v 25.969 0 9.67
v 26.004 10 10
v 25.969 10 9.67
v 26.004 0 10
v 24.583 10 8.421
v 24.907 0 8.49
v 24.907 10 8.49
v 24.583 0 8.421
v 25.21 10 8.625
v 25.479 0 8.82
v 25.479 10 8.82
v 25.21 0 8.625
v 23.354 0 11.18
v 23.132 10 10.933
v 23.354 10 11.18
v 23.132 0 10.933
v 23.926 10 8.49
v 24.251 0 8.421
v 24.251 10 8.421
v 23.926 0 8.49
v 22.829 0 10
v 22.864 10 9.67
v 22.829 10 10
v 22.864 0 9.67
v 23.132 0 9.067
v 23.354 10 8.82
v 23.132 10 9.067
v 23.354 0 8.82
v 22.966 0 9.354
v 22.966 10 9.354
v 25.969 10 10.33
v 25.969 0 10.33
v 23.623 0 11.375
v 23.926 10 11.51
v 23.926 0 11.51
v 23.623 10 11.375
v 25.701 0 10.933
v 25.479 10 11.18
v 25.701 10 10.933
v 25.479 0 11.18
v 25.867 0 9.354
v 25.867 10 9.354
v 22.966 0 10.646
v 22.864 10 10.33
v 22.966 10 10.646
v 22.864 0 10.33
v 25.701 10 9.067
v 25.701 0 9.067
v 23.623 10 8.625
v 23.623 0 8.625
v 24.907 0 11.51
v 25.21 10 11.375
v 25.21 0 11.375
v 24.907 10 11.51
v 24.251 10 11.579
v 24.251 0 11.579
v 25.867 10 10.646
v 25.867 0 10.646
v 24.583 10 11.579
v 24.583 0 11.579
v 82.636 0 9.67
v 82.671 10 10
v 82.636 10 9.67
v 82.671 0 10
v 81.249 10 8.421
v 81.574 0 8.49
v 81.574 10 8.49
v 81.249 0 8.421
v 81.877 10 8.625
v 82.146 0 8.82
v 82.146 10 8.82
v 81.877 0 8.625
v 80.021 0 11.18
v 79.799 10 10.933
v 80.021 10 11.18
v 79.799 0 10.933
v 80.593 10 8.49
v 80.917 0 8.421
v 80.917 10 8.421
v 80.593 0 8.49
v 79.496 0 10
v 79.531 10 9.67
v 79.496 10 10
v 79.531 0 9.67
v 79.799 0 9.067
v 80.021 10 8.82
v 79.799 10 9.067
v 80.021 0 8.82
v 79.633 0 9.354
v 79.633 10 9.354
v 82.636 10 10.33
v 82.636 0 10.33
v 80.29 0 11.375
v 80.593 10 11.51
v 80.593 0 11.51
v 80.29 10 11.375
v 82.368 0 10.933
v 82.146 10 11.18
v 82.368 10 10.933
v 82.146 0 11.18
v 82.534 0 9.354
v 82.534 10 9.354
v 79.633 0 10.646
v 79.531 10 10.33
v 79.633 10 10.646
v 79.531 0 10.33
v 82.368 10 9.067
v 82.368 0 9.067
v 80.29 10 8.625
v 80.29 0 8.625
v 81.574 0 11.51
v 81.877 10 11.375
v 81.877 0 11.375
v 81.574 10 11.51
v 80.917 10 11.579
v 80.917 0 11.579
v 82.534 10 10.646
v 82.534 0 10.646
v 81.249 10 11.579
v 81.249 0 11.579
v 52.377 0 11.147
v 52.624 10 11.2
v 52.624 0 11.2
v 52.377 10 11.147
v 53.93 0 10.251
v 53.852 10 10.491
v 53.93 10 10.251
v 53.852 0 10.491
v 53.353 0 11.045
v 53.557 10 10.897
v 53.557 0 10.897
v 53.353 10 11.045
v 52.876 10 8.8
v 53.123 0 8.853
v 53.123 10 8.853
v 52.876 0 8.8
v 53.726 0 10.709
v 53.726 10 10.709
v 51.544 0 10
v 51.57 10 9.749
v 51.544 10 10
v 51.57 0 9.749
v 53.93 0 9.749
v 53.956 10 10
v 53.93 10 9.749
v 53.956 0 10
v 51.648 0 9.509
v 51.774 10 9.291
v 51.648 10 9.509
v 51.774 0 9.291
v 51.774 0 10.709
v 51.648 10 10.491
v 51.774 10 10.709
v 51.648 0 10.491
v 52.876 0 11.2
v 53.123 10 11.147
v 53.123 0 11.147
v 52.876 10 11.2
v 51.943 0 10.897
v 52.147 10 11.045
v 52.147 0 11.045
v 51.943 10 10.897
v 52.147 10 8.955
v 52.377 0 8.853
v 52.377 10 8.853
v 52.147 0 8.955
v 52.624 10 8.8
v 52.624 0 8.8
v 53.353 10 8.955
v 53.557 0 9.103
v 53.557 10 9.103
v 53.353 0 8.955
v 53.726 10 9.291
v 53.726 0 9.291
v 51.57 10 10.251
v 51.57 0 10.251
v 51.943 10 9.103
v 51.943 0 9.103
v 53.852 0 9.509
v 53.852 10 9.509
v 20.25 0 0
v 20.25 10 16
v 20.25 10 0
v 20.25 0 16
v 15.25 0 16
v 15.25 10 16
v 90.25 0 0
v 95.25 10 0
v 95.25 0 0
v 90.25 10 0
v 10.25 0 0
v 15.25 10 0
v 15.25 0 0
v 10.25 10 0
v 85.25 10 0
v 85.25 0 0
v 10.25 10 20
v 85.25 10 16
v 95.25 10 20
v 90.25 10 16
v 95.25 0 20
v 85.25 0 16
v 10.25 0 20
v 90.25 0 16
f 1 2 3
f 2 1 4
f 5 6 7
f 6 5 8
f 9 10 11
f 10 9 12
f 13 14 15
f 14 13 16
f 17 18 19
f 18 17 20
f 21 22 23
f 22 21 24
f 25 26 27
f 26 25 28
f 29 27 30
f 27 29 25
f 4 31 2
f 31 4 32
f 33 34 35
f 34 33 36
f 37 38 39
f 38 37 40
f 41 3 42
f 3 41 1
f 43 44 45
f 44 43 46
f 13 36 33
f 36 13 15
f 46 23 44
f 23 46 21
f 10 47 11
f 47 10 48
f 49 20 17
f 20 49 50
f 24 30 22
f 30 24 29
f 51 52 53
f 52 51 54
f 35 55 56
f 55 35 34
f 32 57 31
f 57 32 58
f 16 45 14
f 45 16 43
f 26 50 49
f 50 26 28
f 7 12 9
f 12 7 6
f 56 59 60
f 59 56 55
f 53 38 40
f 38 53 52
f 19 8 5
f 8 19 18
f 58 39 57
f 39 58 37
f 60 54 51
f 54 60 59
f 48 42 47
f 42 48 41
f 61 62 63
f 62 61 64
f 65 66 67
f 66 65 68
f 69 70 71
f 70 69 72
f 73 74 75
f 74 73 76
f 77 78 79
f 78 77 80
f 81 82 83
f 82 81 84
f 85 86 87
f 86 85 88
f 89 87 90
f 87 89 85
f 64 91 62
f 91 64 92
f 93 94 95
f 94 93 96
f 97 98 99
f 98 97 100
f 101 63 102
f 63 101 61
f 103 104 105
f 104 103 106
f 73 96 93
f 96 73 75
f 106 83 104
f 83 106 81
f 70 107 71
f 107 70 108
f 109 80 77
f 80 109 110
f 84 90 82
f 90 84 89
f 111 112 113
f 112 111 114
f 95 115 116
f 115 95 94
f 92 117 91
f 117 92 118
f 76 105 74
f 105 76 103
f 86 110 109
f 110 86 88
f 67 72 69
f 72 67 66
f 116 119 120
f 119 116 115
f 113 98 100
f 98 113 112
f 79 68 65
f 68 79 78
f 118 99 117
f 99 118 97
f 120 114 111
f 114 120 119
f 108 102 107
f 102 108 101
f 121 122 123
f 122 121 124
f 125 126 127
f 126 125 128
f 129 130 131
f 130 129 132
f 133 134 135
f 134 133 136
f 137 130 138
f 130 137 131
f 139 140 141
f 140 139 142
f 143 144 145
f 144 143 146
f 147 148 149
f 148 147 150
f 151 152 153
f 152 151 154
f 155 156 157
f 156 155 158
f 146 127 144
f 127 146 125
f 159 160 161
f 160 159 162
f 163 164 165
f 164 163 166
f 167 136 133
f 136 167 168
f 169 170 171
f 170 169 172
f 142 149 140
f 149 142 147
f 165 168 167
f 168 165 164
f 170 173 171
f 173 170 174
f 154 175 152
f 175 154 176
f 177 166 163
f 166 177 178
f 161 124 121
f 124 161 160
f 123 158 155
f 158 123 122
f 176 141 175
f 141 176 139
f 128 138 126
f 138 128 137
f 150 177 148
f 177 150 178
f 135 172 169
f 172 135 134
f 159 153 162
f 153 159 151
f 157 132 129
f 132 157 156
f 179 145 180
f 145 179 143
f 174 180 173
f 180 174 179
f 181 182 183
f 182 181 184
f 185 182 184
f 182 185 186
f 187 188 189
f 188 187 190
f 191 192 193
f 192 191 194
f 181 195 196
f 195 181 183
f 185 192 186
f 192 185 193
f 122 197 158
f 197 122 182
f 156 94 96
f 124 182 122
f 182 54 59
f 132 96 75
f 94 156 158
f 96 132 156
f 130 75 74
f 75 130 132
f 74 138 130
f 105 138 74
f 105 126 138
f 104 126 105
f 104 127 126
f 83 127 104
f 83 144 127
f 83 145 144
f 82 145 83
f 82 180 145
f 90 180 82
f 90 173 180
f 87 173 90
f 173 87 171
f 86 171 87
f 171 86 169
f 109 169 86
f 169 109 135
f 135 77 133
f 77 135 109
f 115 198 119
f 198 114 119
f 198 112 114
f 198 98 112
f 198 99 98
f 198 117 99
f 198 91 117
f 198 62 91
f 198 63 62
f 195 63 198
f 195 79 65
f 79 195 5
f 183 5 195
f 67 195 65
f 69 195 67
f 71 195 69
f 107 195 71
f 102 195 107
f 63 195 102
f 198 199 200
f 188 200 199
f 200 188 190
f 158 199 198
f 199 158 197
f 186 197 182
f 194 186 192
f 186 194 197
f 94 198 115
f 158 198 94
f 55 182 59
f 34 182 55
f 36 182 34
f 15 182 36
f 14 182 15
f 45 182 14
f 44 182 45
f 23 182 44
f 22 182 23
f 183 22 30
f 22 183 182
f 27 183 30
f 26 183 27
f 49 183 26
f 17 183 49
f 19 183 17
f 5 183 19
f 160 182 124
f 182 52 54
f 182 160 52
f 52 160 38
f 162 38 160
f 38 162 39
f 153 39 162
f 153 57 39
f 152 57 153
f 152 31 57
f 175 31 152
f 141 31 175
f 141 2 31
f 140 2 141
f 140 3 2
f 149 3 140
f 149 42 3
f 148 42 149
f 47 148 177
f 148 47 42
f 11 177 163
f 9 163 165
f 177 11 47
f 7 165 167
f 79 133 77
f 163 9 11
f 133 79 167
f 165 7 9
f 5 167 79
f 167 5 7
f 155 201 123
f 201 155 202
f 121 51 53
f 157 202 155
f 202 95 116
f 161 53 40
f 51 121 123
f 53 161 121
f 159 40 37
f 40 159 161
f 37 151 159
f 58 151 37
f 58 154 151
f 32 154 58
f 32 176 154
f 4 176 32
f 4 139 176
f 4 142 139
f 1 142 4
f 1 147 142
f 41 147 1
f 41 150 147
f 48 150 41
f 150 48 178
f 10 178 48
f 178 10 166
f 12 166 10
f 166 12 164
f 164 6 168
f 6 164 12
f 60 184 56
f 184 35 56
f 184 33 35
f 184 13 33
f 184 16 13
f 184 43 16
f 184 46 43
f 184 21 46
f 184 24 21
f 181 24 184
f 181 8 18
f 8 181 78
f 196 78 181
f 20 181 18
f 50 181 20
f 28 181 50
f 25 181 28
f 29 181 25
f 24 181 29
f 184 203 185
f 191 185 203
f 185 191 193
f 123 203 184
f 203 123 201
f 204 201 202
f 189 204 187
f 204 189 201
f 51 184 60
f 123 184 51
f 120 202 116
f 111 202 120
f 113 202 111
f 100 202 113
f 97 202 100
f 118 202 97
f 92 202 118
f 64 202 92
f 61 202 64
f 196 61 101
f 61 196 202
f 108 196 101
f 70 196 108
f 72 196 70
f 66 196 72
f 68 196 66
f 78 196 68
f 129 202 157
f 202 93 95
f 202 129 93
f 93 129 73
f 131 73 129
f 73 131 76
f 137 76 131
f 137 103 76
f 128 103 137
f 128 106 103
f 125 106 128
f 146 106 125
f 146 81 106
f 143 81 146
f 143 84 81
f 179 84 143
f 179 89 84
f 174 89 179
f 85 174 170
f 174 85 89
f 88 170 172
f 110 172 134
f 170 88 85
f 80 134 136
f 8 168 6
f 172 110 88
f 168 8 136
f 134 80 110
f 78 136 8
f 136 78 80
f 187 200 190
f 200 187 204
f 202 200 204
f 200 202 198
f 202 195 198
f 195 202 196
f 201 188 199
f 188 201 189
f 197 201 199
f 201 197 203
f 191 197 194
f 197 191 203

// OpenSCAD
// file: tall_wall.scad
include <defs.scad>
use <assembly.scad>
use <slab.scad>

module TallWall()
{
    cube([tall_wall_x, tall_wall_y, tall_wall_z ]);
}


difference()
{
    tall_wall_origin()
    {
        TallWall();
    }
    Holes();
}
// file: slab.scad
include <defs.scad>


module make_slab()
{
    cube([slab_x, slab_y, slab_z]);
}

module make_linear_hole()
{
    rotate([-90,0,0]) cylinder(slab_y,linear_bearing_or,linear_bearing_or);
    // infinite hole
    rotate([-90,0,180]) cylinder(forever,linear_bearing_ir,linear_bearing_ir);
}
module make_bearing_insert()
{
    rotate([-90,0,0]) cylinder(bearing_y,bearing_or,bearing_or);
    // infinite hole
    r = bearing_ir - threaded_rod_r_grip;
    rotate([-90,0,180]) cylinder(forever,r,r);
}


module make_slab_holes()
{
    translate([linear_bearing_offset,0,short_wall_z/2])
    {
        if ($children > 0) children(0);
    }
    translate([tall_wall_y - linear_bearing_offset,0,short_wall_z/2])
    {
        if ($children > 2) children(2);
    }
    translate([tall_wall_y/2,0,short_wall_z/2])
    {
        if ($children > 1) children(1);
    }
}

difference()
{
    color ("green") make_slab();
    make_slab_holes()
    {
        make_linear_hole();
        make_bearing_insert();
        make_linear_hole();
    }
}
// file: assembly.scad
include <defs.scad>
include <slab.scad>
use <short_wall.scad>
use <tall_wall.scad>


module to_slab_positions_y(slab_offset = slaby_o)
{
    // close short slab
    translate([tall_wall_x + ptol/2,
            short_wall_y + ptol + slab_offset,
            0]) children();

    // far short slab
    translate([tall_wall_x + ptol/2, 
            tall_wall_y - (short_wall_y+slab_y)  - slab_offset,
            0])
        translate([tall_wall_y,slab_y,0]) rotate([0,0,180]) children();
}
module to_slab_positions_x(slab_offset = slabx_o)
{
    // right top slab
    translate([ tall_wall_x + tall_wall_y - slab_y - slab_offset,0,short_wall_z + ptol])
        translate([slab_y,0,0]) rotate([0,0,90]) children();

    // right bottom slab
    translate([tall_wall_x + tall_wall_y - slab_y - slab_offset,0,-short_wall_z - ptol])
        translate([slab_y,0,0]) rotate([0,0,90]) children();

    // left top slab
    translate([tall_wall_x + ptol + slab_offset,0, short_wall_z + ptol])
        translate([0,tall_wall_y,0]) rotate([0,0,-90]) children();

    // left bottom slab
    translate([tall_wall_x + ptol + slab_offset,0, -short_wall_z - ptol])
        translate([0,tall_wall_y,0]) rotate([0,0,-90]) children();
}
module to_slab_positions(slab_offsetx = slabx_o, slab_offsety = slaby_o)
{
    to_slab_positions_x(slab_offsetx) children();
    to_slab_positions_y(slab_offsety) children();
}

module short_wall_origin()
{
    translate([tall_wall_x+ptol/2,0,0])
    {
        children();
    }
}

module to_short_wall_positions()
{
    short_wall_origin()
    {
        children();
        translate([0, inside_width + short_wall_y + ptol]) children();
    }
}


module tall_wall_origin()
{
    translate([0,0,-short_wall_z])
    {
        children();
    }
}


module Solids()
{

    to_short_wall_positions()
    {
        color("orange") ShortWall();
    }

    tall_wall_origin()
    {
        TallWall();
        translate([tall_wall_x + tall_wall_y + ptol,0,0])
        {
            TallWall();
        }
    }

    to_slab_positions()
    {
        color("green") make_slab();
    }

}

module Holes()
{
    to_slab_positions()
    {
        make_slab_holes()
        {
            make_linear_hole();
            make_bearing_insert();
            make_linear_hole();
        }
    }
    make_short_wall_holes();
}
// file: defs.scad
// Special
function in2mm( mm ) = mm*25.4;
function mm( mm ) = mm;
$fs = 0.1;
forever = 1000;
//

// Configuration
SCALE = 2;  
model_threads = 0;  // inversely proportional to size
apply_mold = 0;
apply_pin_matrix = 0;
inside_width = 130/SCALE;
//

// Walls

_wall_thickness = 20/SCALE;

short_wall_x = inside_width + _wall_thickness*2;
short_wall_y = _wall_thickness;
short_wall_z = 40/SCALE;

tall_wall_x = _wall_thickness;
tall_wall_y = short_wall_x;
tall_wall_z = short_wall_z * 3;


short_wall_cut_y = short_wall_y;
short_wall_cut_x = tall_wall_x/2;
short_wall_cut_z = short_wall_z*4/5;
short_wall_cut_offset = tall_wall_x/2;

slab_shortener = 4/SCALE;
slab_wall = short_wall_z/2;

hole_rad = 2/SCALE;
ptol = 1/SCALE;
//

// Slabs and holes

_slab_thickness = in2mm(1.0/4);

slab_x = tall_wall_y;
slab_y = _slab_thickness;
slab_z = short_wall_z;


linear_bearing_offset = tall_wall_y/6;
linear_bearing_or = in2mm(1/4/2);
linear_bearing_ir = in2mm(1/8/2);

bearing_or = in2mm(1.0/4/2);
bearing_ir = in2mm(1.0/8/2);
bearing_y = in2mm(3.0/32);

threaded_rod_r_grip = in2mm(0.015);  // how much to shrink hole on threaded rod to get traction
//

// Assembly and appearance

slabx_o = in2mm(0.1);
slaby_o = in2mm(0.1);

pin_z = 150/SCALE;
pin_x = 2/SCALE;
matrix_pad_x = 8;
matrix_pad_y = 2;
pin_pad = 0.2;
//
// main file
include <defs.scad>
use <assembly.scad>
use <slab.scad>

module short_wall_holes()
{
    
}

module ShortWall()
{
    cube([ short_wall_x, short_wall_y, short_wall_z]);
}

module _put_screw_holes(rot=0)
{
    translate([0,slab_thickness/2,short_wall_z/5])
    {
        rotate([0,90,0+rot])
            cylinder(wall_screw_l, wall_screw_ri, wall_screw_ri);
        rotate([0,90,180+rot])
            cylinder(forever, wall_screw_ri, wall_screw_ri);
    }
    translate([0,slab_thickness/2,short_wall_z*4/5])
    {
        rotate([0,90,0+rot])
            cylinder(wall_screw_l, wall_screw_ri, wall_screw_ri);
        rotate([0,90,180+rot])
            cylinder(forever, wall_screw_ri, wall_screw_ri);
    }

}

module make_short_wall_holes()
{
    to_short_wall_positions()
    {
        translate([short_wall_cut_offset,0,0])
        {
            cube([short_wall_cut_x, short_wall_cut_y, short_wall_cut_z]);
        }
        translate([tall_wall_y - short_wall_cut_offset - short_wall_cut_x,0,0])
        {
            cube([short_wall_cut_x, short_wall_cut_y, short_wall_cut_z]);
        }

        /*_put_screw_holes();*/
        /*translate([slab_l,0,0])*/
            /*_put_screw_holes(180);*/
    }
}


difference()
{
    short_wall_origin()
    {
        ShortWall();
    }
    Holes();
    make_short_wall_holes();
}
